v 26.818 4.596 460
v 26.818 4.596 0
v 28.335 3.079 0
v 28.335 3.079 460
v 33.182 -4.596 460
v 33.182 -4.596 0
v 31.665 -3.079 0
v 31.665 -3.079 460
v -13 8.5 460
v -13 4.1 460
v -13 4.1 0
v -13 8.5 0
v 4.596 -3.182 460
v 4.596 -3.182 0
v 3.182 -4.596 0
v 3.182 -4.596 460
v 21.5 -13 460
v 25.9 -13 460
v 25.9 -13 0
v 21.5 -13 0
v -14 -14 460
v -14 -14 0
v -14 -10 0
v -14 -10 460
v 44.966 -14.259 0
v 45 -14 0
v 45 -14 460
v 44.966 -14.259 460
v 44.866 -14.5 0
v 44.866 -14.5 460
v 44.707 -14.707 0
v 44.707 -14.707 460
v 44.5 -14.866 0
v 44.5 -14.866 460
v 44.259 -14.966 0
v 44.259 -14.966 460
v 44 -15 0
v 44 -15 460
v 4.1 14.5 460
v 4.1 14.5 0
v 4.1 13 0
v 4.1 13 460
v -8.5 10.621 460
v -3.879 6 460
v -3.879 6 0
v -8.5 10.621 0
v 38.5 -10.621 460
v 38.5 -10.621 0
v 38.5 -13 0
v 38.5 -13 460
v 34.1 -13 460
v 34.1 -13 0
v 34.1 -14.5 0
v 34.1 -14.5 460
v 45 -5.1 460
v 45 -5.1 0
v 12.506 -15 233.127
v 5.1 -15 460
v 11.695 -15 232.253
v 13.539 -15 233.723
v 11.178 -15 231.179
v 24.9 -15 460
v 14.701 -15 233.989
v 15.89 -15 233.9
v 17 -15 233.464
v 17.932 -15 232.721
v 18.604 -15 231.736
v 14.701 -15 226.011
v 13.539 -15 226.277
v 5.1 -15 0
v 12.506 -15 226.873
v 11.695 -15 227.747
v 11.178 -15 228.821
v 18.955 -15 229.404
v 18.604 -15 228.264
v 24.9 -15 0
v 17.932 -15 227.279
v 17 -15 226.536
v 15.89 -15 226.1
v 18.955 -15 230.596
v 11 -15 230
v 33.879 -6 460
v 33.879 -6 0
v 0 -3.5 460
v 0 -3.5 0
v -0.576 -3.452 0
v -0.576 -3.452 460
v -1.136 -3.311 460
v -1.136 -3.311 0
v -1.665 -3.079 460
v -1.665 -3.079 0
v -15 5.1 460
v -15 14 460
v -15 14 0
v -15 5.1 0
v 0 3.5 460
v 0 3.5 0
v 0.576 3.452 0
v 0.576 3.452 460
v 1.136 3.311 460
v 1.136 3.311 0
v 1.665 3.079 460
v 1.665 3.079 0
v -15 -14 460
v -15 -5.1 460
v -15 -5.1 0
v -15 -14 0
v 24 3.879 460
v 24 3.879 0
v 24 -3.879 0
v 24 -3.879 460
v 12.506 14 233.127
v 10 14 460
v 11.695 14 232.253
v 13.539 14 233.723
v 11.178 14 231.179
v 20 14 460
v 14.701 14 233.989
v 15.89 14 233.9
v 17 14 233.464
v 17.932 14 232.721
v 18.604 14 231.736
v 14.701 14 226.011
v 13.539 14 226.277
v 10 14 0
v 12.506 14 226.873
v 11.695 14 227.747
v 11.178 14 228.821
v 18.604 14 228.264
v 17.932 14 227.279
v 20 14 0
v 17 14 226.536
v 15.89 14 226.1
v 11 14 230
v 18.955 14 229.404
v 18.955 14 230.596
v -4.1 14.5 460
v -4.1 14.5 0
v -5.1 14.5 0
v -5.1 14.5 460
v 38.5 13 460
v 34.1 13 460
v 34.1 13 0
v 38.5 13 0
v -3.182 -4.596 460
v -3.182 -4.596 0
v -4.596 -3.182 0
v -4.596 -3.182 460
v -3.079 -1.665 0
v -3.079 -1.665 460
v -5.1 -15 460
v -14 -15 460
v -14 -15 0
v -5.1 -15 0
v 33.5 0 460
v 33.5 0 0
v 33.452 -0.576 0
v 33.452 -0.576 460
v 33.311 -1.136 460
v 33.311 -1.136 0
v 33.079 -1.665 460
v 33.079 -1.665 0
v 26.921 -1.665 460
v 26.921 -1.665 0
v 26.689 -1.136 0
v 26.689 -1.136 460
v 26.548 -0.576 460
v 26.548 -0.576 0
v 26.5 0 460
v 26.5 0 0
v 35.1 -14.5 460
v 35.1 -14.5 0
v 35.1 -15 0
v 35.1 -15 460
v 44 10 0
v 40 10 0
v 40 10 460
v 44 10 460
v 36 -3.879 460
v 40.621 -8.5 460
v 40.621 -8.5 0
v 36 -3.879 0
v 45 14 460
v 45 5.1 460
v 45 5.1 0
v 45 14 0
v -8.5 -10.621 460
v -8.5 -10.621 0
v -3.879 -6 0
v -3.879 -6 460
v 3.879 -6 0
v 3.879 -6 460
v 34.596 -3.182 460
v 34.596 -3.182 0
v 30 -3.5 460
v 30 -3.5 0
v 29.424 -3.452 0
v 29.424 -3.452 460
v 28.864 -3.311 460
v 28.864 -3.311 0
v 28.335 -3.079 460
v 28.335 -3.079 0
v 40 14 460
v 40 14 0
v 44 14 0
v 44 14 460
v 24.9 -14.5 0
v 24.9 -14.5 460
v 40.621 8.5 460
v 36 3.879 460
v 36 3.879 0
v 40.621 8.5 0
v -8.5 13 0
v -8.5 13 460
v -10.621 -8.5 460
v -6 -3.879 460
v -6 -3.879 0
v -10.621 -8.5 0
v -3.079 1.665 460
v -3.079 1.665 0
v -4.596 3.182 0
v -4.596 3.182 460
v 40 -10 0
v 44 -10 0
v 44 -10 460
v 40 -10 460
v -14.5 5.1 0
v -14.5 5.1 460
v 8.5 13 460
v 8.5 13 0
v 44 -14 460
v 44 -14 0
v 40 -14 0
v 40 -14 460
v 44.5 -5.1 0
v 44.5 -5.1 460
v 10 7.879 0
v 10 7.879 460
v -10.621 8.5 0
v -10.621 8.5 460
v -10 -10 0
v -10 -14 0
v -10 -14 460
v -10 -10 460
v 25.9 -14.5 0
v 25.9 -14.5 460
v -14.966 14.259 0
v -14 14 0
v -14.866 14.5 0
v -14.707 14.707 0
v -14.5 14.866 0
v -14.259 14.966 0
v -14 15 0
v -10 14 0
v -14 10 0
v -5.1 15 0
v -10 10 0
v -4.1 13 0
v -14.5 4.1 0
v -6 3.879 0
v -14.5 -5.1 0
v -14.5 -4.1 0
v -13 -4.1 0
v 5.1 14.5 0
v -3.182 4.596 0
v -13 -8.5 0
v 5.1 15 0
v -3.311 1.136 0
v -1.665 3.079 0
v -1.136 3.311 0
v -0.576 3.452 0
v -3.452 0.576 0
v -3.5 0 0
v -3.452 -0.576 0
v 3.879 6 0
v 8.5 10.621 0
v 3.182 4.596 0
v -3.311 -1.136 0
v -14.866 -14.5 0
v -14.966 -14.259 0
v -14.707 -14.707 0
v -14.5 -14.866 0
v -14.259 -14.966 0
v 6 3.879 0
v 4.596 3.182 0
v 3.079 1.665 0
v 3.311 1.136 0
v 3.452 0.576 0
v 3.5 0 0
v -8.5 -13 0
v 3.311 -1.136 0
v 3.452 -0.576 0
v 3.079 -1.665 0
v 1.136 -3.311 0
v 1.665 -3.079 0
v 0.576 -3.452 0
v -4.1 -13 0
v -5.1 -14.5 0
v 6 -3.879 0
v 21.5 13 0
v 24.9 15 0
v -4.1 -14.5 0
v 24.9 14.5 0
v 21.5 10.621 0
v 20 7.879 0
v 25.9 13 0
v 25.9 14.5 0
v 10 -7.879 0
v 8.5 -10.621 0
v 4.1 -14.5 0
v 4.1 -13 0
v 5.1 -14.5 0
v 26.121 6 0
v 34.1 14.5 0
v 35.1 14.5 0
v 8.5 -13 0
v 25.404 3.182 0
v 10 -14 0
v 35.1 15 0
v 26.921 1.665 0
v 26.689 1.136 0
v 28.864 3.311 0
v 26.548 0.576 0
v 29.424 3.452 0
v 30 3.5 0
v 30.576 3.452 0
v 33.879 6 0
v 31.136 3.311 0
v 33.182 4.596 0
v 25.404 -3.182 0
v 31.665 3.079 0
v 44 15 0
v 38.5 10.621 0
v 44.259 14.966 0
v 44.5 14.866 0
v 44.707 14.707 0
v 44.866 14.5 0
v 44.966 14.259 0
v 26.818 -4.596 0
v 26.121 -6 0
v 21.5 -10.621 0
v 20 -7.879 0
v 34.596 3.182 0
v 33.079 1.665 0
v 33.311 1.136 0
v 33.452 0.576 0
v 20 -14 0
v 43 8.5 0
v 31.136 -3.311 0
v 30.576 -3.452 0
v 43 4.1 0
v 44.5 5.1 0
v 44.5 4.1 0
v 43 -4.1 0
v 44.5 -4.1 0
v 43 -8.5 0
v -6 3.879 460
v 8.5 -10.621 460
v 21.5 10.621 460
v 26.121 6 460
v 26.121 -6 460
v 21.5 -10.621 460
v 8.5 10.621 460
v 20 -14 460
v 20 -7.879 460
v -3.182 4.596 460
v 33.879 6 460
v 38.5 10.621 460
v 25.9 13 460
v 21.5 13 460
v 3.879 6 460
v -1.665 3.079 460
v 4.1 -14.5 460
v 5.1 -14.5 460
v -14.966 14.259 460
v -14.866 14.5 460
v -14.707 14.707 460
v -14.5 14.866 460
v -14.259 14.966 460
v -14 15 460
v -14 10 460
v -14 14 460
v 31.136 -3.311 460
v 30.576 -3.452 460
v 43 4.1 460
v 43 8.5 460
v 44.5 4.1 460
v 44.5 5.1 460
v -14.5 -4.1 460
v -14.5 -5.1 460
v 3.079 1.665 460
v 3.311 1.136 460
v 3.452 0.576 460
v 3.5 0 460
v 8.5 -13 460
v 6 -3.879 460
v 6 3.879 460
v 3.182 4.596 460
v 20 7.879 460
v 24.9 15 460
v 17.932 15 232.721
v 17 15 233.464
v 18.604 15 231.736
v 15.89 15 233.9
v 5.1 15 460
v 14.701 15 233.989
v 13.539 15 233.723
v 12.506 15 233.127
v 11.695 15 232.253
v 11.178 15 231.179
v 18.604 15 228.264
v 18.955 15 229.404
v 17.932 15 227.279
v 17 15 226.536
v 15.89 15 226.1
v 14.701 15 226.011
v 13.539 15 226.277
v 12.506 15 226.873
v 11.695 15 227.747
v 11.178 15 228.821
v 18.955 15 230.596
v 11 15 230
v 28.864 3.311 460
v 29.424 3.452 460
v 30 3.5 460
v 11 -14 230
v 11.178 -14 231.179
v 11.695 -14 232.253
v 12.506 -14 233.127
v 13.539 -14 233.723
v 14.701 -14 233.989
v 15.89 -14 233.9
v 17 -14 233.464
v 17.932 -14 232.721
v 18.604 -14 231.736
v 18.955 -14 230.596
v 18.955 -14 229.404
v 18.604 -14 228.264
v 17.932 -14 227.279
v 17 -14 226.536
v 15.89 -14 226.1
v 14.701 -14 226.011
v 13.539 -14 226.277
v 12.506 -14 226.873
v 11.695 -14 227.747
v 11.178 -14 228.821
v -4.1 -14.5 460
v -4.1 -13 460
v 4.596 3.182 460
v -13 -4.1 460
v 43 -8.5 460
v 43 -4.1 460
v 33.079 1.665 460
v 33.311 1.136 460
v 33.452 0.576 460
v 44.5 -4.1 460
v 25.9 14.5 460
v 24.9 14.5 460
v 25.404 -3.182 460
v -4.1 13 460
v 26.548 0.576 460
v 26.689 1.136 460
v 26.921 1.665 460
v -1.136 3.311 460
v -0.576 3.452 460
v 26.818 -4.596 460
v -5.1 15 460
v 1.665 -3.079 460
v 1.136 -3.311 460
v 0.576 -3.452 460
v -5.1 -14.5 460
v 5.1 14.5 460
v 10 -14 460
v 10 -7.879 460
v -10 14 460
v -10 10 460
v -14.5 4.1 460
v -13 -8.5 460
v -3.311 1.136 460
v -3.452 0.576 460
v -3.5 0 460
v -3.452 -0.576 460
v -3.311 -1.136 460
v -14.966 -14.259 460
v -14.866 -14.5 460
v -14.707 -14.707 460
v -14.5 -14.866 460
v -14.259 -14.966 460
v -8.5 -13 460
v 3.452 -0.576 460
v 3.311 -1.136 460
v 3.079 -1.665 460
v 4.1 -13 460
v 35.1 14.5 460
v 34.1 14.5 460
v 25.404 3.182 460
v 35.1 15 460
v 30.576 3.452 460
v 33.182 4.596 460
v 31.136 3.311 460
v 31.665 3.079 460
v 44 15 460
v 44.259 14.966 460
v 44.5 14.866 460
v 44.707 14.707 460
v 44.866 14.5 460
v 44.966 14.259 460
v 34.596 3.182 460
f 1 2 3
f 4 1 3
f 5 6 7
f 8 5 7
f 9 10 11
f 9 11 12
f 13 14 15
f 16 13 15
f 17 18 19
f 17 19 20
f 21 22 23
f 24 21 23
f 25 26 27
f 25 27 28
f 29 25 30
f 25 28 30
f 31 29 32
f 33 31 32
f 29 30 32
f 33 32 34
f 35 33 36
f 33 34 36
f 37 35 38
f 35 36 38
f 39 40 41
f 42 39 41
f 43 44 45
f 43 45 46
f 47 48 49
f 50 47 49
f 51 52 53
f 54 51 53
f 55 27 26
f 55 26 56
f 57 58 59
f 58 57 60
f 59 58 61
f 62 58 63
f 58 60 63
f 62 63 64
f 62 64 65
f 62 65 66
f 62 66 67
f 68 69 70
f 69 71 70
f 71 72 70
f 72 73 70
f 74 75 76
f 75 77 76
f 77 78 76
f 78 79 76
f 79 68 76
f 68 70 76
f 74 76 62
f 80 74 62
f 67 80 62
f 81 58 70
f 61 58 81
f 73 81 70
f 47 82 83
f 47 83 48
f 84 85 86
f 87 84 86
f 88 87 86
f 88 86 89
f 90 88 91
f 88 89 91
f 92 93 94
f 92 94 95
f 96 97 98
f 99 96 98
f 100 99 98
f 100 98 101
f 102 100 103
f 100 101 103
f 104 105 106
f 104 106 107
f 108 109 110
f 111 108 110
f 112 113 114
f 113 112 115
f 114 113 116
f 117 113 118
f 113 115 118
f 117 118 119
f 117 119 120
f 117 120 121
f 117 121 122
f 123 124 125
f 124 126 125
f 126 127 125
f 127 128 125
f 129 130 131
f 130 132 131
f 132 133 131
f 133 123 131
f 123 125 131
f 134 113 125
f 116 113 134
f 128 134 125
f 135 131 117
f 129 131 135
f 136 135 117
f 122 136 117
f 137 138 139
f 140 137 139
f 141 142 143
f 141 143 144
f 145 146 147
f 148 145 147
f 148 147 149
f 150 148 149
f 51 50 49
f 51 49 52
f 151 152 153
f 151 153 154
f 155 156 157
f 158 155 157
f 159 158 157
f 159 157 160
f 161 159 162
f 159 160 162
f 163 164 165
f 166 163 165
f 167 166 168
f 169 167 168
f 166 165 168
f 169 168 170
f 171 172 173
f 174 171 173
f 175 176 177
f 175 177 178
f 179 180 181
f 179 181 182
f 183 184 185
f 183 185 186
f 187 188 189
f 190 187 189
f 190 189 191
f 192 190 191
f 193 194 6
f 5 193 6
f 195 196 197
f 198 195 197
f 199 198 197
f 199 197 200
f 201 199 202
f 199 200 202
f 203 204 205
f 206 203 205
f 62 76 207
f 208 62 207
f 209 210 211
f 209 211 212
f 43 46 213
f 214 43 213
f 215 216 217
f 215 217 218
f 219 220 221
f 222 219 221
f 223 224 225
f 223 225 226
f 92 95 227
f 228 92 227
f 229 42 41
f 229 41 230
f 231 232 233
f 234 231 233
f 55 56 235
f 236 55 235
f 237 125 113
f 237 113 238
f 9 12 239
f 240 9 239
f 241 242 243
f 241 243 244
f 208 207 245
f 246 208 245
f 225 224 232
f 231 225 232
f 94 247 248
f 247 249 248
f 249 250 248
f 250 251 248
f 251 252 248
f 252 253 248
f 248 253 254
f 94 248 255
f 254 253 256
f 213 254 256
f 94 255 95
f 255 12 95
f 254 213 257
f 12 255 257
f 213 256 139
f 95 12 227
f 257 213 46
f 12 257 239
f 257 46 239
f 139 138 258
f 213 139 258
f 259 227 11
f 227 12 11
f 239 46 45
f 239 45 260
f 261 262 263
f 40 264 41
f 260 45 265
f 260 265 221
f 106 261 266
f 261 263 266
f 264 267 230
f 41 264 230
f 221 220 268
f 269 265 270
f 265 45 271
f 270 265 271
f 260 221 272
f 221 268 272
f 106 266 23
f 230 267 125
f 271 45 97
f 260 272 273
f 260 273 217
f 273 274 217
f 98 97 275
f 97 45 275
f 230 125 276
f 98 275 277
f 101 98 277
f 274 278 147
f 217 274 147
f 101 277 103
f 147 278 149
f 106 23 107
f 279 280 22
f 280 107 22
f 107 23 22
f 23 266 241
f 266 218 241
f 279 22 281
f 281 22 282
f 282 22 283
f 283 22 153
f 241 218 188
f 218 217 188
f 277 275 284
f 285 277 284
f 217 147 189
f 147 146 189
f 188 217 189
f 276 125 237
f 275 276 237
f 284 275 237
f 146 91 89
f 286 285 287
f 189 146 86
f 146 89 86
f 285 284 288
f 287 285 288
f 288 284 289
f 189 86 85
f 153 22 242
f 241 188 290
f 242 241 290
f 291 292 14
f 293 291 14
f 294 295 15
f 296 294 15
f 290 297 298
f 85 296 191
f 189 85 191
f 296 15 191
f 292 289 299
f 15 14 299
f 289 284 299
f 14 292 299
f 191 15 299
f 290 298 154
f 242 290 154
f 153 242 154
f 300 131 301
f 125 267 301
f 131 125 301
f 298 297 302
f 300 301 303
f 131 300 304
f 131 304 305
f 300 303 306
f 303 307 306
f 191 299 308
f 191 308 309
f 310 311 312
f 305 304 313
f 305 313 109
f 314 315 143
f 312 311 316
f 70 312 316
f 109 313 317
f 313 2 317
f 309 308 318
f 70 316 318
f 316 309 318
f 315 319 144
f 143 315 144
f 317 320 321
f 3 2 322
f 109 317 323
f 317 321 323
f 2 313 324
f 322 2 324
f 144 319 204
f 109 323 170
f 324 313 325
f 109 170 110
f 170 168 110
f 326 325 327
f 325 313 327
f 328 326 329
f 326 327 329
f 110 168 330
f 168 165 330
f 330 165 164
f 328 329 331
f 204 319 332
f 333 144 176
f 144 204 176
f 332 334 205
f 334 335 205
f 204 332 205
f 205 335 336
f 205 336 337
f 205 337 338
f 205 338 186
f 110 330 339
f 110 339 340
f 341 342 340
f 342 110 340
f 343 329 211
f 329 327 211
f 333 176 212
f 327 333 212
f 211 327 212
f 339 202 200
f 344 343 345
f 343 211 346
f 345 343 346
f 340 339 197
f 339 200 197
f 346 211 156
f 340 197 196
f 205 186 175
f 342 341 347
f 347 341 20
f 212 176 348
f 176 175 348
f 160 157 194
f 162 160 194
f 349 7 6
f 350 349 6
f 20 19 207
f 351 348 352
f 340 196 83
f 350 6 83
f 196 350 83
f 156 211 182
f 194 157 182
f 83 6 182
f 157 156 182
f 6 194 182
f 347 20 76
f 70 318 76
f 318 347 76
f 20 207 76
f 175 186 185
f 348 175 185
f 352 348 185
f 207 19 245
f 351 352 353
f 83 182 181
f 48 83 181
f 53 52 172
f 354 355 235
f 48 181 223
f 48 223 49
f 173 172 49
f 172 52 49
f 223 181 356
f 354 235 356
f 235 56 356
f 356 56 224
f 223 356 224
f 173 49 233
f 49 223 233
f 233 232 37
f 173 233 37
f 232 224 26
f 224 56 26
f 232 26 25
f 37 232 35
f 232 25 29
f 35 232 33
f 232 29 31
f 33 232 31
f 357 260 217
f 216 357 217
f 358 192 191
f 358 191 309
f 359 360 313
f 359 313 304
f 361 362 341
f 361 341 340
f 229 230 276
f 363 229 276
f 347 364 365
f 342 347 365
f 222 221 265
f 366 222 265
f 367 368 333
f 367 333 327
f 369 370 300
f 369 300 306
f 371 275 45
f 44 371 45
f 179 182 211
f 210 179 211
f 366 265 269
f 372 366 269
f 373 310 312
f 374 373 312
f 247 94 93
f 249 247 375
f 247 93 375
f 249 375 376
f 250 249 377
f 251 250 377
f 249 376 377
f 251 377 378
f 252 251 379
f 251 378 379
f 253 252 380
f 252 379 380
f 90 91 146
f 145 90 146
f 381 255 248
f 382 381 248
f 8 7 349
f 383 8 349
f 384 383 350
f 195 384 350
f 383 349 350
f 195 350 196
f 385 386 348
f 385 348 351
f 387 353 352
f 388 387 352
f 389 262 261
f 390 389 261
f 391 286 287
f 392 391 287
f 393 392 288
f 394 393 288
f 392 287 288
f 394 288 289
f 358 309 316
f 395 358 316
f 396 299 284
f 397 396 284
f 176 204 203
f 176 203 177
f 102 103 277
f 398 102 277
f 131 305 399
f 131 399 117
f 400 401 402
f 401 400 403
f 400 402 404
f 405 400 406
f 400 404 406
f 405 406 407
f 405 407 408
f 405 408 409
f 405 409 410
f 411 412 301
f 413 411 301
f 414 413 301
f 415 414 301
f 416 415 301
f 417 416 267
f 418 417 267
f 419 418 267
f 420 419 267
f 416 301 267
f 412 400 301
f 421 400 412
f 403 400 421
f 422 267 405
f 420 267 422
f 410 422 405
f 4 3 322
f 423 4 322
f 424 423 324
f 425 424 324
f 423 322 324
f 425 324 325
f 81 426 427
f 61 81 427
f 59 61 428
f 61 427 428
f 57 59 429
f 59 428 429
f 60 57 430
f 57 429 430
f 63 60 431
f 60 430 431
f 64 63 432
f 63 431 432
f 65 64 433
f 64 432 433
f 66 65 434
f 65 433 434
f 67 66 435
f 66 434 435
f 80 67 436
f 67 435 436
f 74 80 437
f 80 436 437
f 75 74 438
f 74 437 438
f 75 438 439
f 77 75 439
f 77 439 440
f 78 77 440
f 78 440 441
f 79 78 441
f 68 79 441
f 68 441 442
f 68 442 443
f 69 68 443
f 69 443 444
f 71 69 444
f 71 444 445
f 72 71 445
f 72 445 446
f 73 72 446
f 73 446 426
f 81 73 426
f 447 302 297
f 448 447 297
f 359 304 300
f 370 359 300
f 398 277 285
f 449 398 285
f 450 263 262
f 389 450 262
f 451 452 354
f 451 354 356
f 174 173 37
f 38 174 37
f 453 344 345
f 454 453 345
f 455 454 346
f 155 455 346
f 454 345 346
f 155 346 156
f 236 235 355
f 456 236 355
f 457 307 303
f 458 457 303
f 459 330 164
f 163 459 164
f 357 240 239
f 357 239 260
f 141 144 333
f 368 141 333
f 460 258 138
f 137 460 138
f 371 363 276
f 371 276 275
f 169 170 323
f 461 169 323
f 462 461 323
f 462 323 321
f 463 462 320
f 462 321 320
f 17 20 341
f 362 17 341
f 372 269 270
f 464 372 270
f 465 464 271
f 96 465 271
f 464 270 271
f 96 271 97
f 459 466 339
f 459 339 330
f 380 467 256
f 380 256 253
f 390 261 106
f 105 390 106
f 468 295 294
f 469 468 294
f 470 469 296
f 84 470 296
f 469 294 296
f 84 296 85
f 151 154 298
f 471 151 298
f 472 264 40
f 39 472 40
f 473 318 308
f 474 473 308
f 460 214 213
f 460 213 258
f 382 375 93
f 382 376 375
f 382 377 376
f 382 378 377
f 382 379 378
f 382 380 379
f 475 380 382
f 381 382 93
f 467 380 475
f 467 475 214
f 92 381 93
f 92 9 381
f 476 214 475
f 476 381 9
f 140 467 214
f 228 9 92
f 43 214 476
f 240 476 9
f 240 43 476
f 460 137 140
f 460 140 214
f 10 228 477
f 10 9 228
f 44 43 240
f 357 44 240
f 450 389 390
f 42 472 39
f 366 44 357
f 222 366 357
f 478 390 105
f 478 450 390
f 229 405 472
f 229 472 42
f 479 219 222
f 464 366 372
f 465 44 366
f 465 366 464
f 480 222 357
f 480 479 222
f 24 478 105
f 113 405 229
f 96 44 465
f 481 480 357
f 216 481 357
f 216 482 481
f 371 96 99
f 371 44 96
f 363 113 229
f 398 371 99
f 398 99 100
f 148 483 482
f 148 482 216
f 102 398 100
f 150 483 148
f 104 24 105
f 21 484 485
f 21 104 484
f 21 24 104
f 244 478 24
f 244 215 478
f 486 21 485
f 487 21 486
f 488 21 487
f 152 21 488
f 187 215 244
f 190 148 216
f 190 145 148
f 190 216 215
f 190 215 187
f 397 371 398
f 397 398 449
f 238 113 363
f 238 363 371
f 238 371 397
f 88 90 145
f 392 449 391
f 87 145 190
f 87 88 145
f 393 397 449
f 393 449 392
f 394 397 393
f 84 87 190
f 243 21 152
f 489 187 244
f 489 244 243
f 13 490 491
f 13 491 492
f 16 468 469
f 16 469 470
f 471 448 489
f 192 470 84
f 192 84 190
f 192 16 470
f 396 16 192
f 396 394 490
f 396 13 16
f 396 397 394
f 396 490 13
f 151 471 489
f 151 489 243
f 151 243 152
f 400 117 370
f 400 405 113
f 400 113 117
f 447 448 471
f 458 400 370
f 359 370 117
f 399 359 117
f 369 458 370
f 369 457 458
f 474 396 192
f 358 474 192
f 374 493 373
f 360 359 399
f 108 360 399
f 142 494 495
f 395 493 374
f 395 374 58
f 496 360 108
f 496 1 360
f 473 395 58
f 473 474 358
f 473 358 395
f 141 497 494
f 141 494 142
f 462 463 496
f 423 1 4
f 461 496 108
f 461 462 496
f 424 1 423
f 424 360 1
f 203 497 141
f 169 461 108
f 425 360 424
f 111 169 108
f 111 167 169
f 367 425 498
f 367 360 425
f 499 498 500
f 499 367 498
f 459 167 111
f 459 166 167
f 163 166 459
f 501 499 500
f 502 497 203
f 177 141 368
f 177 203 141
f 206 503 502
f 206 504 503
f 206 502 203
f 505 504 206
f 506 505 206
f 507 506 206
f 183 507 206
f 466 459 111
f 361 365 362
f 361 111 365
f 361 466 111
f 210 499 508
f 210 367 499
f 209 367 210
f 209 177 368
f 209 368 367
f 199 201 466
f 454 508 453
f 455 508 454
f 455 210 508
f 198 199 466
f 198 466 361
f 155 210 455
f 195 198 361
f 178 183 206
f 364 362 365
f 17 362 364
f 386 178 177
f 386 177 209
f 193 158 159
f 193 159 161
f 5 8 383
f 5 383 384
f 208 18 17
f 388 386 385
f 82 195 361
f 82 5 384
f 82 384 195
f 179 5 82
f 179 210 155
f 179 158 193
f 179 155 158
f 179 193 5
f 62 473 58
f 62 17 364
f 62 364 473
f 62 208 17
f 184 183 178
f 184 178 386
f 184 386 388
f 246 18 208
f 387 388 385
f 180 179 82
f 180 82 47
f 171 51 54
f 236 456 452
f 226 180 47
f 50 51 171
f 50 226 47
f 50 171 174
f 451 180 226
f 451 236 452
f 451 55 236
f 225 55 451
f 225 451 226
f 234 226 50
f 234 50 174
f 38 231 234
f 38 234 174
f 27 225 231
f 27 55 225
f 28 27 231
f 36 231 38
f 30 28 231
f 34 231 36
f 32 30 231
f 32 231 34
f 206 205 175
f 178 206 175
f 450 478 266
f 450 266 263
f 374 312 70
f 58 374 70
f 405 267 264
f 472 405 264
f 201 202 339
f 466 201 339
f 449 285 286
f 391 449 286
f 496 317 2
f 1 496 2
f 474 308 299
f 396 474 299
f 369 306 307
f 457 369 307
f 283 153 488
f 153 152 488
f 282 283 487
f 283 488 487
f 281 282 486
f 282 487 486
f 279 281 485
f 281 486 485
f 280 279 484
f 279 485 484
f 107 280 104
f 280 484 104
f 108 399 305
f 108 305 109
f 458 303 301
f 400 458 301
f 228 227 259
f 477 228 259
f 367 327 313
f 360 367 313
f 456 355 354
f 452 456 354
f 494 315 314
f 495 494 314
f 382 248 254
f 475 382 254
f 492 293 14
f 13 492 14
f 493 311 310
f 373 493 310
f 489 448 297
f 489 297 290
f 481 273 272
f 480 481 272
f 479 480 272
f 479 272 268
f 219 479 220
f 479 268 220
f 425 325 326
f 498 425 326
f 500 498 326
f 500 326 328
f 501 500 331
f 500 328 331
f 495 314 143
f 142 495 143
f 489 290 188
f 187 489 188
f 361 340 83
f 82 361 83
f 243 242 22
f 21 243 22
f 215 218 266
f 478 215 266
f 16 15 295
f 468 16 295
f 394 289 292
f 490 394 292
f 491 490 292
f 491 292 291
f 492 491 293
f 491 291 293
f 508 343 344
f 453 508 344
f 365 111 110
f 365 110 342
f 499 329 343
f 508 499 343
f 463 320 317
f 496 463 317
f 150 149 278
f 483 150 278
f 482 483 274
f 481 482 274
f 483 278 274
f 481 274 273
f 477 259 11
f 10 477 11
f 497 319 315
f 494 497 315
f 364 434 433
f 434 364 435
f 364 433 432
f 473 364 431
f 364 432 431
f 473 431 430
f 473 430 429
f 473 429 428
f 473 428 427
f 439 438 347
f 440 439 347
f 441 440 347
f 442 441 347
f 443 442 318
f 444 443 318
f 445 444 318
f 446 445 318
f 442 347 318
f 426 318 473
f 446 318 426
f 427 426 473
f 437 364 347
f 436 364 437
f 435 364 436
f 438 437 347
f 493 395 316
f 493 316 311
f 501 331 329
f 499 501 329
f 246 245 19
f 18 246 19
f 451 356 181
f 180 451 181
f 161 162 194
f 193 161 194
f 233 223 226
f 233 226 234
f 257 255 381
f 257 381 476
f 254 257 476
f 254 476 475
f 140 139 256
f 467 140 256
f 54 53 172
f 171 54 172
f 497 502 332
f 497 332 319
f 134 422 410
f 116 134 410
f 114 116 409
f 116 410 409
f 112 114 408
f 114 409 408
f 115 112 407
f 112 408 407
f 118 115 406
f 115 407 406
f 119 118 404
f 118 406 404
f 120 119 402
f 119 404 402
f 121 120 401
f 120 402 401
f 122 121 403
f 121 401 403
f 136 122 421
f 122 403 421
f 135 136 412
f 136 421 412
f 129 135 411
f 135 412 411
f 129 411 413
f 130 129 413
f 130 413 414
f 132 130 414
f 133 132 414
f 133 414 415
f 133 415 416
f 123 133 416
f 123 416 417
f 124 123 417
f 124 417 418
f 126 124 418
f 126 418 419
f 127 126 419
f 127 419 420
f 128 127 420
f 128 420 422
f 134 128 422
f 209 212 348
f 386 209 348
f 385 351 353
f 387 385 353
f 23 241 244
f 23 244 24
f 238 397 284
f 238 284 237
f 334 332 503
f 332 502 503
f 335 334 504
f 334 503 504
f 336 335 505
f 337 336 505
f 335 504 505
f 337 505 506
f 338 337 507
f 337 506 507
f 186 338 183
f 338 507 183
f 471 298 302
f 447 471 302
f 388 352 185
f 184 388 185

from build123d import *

# Parameters (mm, degrees)
ESBO_O1_W                      = 4
ESBO_O1_H                      = 4
RESSALTO_EXTRUS_O1_DEPTH       = 460
PADR_OCIRCULAR1_COUNT          = 4
PADR_O_LINEAR1_COUNT           = 2
PADR_O_LINEAR1_PITCH           = 30
PADR_O_LINEAR1_COPY_1_SKETCH_W = 4
PADR_O_LINEAR1_COPY_1_SKETCH_H = 4
PADR_O_LINEAR1_COPY_1_DEPTH    = 460
PADR_O_LINEAR1_COPY_2_SKETCH_W = 4
PADR_O_LINEAR1_COPY_2_SKETCH_H = 4
PADR_O_LINEAR1_COPY_2_DEPTH    = 460
PADR_O_LINEAR1_COPY_3_SKETCH_W = 4
PADR_O_LINEAR1_COPY_3_SKETCH_H = 4
PADR_O_LINEAR1_COPY_3_DEPTH    = 460
ESBO_O4_W                      = 10
ESBO_O4_H                      = 28
CORTE_EXTRUS_O1_DEPTH          = 463.439185191
FILETE1_R                      = 1
ESBO_O5_R                      = 4
CORTE_EXTRUS_O2_DEPTH          = 464.168435885


with BuildPart() as part:
    # Esboço1 → Ressalto-extrusão1 (new body)
    with BuildSketch(Plane.XY):
        with BuildLine():
            ThreePointArc((-1.664601464, 3.078815026), (-0.858529967, 3.393070335), (0, 3.5))
            Line((0, 3.5), (0, 6))
            Line((0, 6), (-3.878679656, 6))
            Line((-3.878679656, 6), (-8.5, 10.621320344))
            Line((-8.5, 10.621320344), (-8.5, 13))
            Line((-8.5, 13), (-4.1, 13))
            Line((-4.1, 13), (-4.1, 14.5))
            Line((-4.1, 14.5), (-5.1, 14.5))
            Line((-5.1, 14.5), (-5.1, 15))
            Line((-5.1, 15), (-15, 15))
            Line((-15, 15), (-15, 5.1))
            Line((-15, 5.1), (-14.5, 5.1))
            Line((-14.5, 5.1), (-14.5, 4.1))
            Line((-14.5, 4.1), (-13, 4.1))
            Line((-13, 4.1), (-13, 8.5))
            Line((-13, 8.5), (-10.621320344, 8.5))
            Line((-10.621320344, 8.5), (-6, 3.878679656))
            Line((-6, 3.878679656), (-6, 0))
            Line((-6, 0), (-3.5, 0))
            ThreePointArc((-3.5, 0), (-3.393070335, 0.858529967), (-3.078815026, 1.664601464))
            Line((-3.078815026, 1.664601464), (-4.596194078, 3.181980515))
            Line((-4.596194078, 3.181980515), (-3.181980515, 4.596194078))
            Line((-3.181980515, 4.596194078), (-1.664601464, 3.078815026))
        make_face()
        with Locations((-12, 12)):
            Rectangle(ESBO_O1_W, ESBO_O1_H, mode=Mode.SUBTRACT)
    ressalto_extrus_o1 = extrude(amount=RESSALTO_EXTRUS_O1_DEPTH)

    # PadrãoCircular1: Ressalto-extrusão1 ×4 about axis
    padr_ocircular1_axis = Axis((0, 0, 0), (0, 0, 1))
    for i in range(1, PADR_OCIRCULAR1_COUNT):
        add(ressalto_extrus_o1.rotate(padr_ocircular1_axis, i * 360 / PADR_OCIRCULAR1_COUNT))

    # Padrão linear1: Ressalto-extrusão1 ×2
    with Locations(*[(i * PADR_O_LINEAR1_PITCH, 0, 0) for i in range(1, PADR_O_LINEAR1_COUNT)]):
        add(ressalto_extrus_o1)

    # Padrão linear1 copy 1 sketch → Padrão linear1 copy 1 (add)
    with BuildSketch(Plane(origin=(30, 0, 0), x_dir=(0, 1, 0), z_dir=(0, 0, 1))):
        with BuildLine():
            ThreePointArc((-1.664601464, 3.078815026), (-0.858529967, 3.393070335), (0, 3.5))
            Line((0, 3.5), (0, 6))
            Line((0, 6), (-3.878679656, 6))
            Line((-3.878679656, 6), (-8.5, 10.621320344))
            Line((-8.5, 10.621320344), (-8.5, 13))
            Line((-8.5, 13), (-4.1, 13))
            Line((-4.1, 13), (-4.1, 14.5))
            Line((-4.1, 14.5), (-5.1, 14.5))
            Line((-5.1, 14.5), (-5.1, 15))
            Line((-5.1, 15), (-15, 15))
            Line((-15, 15), (-15, 5.1))
            Line((-15, 5.1), (-14.5, 5.1))
            Line((-14.5, 5.1), (-14.5, 4.1))
            Line((-14.5, 4.1), (-13, 4.1))
            Line((-13, 4.1), (-13, 8.5))
            Line((-13, 8.5), (-10.621320344, 8.5))
            Line((-10.621320344, 8.5), (-6, 3.878679656))
            Line((-6, 3.878679656), (-6, 0))
            Line((-6, 0), (-3.5, 0))
            ThreePointArc((-3.5, 0), (-3.393070335, 0.858529967), (-3.078815026, 1.664601464))
            Line((-3.078815026, 1.664601464), (-4.596194078, 3.181980515))
            Line((-4.596194078, 3.181980515), (-3.181980515, 4.596194078))
            Line((-3.181980515, 4.596194078), (-1.664601464, 3.078815026))
        make_face()
        with Locations((-12, 12)):
            Rectangle(PADR_O_LINEAR1_COPY_1_SKETCH_W, PADR_O_LINEAR1_COPY_1_SKETCH_H, mode=Mode.SUBTRACT)
    extrude(amount=PADR_O_LINEAR1_COPY_1_DEPTH)

    # Padrão linear1 copy 2 sketch → Padrão linear1 copy 2 (add)
    with BuildSketch(Plane(origin=(30, 0, 0), x_dir=(-1, 0, 0), z_dir=(0, 0, 1))):
        with BuildLine():
            ThreePointArc((-1.664601464, 3.078815026), (-0.858529967, 3.393070335), (0, 3.5))
            Line((0, 3.5), (0, 6))
            Line((0, 6), (-3.878679656, 6))
            Line((-3.878679656, 6), (-8.5, 10.621320344))
            Line((-8.5, 10.621320344), (-8.5, 13))
            Line((-8.5, 13), (-4.1, 13))
            Line((-4.1, 13), (-4.1, 14.5))
            Line((-4.1, 14.5), (-5.1, 14.5))
            Line((-5.1, 14.5), (-5.1, 15))
            Line((-5.1, 15), (-15, 15))
            Line((-15, 15), (-15, 5.1))
            Line((-15, 5.1), (-14.5, 5.1))
            Line((-14.5, 5.1), (-14.5, 4.1))
            Line((-14.5, 4.1), (-13, 4.1))
            Line((-13, 4.1), (-13, 8.5))
            Line((-13, 8.5), (-10.621320344, 8.5))
            Line((-10.621320344, 8.5), (-6, 3.878679656))
            Line((-6, 3.878679656), (-6, 0))
            Line((-6, 0), (-3.5, 0))
            ThreePointArc((-3.5, 0), (-3.393070335, 0.858529967), (-3.078815026, 1.664601464))
            Line((-3.078815026, 1.664601464), (-4.596194078, 3.181980515))
            Line((-4.596194078, 3.181980515), (-3.181980515, 4.596194078))
            Line((-3.181980515, 4.596194078), (-1.664601464, 3.078815026))
        make_face()
        with Locations((-12, 12)):
            Rectangle(PADR_O_LINEAR1_COPY_2_SKETCH_W, PADR_O_LINEAR1_COPY_2_SKETCH_H, mode=Mode.SUBTRACT)
    extrude(amount=PADR_O_LINEAR1_COPY_2_DEPTH)

    # Padrão linear1 copy 3 sketch → Padrão linear1 copy 3 (add)
    with BuildSketch(Plane(origin=(30, 0, 0), x_dir=(0, -1, 0), z_dir=(0, 0, 1))):
        with BuildLine():
            ThreePointArc((-1.664601464, 3.078815026), (-0.858529967, 3.393070335), (0, 3.5))
            Line((0, 3.5), (0, 6))
            Line((0, 6), (-3.878679656, 6))
            Line((-3.878679656, 6), (-8.5, 10.621320344))
            Line((-8.5, 10.621320344), (-8.5, 13))
            Line((-8.5, 13), (-4.1, 13))
            Line((-4.1, 13), (-4.1, 14.5))
            Line((-4.1, 14.5), (-5.1, 14.5))
            Line((-5.1, 14.5), (-5.1, 15))
            Line((-5.1, 15), (-15, 15))
            Line((-15, 15), (-15, 5.1))
            Line((-15, 5.1), (-14.5, 5.1))
            Line((-14.5, 5.1), (-14.5, 4.1))
            Line((-14.5, 4.1), (-13, 4.1))
            Line((-13, 4.1), (-13, 8.5))
            Line((-13, 8.5), (-10.621320344, 8.5))
            Line((-10.621320344, 8.5), (-6, 3.878679656))
            Line((-6, 3.878679656), (-6, 0))
            Line((-6, 0), (-3.5, 0))
            ThreePointArc((-3.5, 0), (-3.393070335, 0.858529967), (-3.078815026, 1.664601464))
            Line((-3.078815026, 1.664601464), (-4.596194078, 3.181980515))
            Line((-4.596194078, 3.181980515), (-3.181980515, 4.596194078))
            Line((-3.181980515, 4.596194078), (-1.664601464, 3.078815026))
        make_face()
        with Locations((-12, 12)):
            Rectangle(PADR_O_LINEAR1_COPY_3_SKETCH_W, PADR_O_LINEAR1_COPY_3_SKETCH_H, mode=Mode.SUBTRACT)
    extrude(amount=PADR_O_LINEAR1_COPY_3_DEPTH)

    # Esboço4 → Corte-extrusão1 (cut, through all)
    with BuildSketch(Plane(origin=(0, 0, 0), x_dir=(-1, 0, 0), z_dir=(0, 0, -1))):
        with Locations((-15, 0)):
            Rectangle(ESBO_O4_W, ESBO_O4_H)
    extrude(amount=-CORTE_EXTRUS_O1_DEPTH, mode=Mode.SUBTRACT)

    # Filete1
    filete1_edges = [part.edges().sort_by_distance(p)[0] for p in [
        (45, -15, 230),
        (45, 15, 230),
        (-15, 15, 230),
        (-15, -15, 230),
    ]]
    fillet(filete1_edges, radius=FILETE1_R)

    # Esboço5 → Corte-extrusão2 (cut, through all)
    with BuildSketch(Plane(origin=(0, 15, 0), x_dir=(1, 0, 0), z_dir=(0, 1, 0))):
        with Locations(Location((15, -230, 0), (0, 0, 180))):
            Circle(ESBO_O5_R)
    extrude(amount=-CORTE_EXTRUS_O2_DEPTH, mode=Mode.SUBTRACT)


solid = part.part
